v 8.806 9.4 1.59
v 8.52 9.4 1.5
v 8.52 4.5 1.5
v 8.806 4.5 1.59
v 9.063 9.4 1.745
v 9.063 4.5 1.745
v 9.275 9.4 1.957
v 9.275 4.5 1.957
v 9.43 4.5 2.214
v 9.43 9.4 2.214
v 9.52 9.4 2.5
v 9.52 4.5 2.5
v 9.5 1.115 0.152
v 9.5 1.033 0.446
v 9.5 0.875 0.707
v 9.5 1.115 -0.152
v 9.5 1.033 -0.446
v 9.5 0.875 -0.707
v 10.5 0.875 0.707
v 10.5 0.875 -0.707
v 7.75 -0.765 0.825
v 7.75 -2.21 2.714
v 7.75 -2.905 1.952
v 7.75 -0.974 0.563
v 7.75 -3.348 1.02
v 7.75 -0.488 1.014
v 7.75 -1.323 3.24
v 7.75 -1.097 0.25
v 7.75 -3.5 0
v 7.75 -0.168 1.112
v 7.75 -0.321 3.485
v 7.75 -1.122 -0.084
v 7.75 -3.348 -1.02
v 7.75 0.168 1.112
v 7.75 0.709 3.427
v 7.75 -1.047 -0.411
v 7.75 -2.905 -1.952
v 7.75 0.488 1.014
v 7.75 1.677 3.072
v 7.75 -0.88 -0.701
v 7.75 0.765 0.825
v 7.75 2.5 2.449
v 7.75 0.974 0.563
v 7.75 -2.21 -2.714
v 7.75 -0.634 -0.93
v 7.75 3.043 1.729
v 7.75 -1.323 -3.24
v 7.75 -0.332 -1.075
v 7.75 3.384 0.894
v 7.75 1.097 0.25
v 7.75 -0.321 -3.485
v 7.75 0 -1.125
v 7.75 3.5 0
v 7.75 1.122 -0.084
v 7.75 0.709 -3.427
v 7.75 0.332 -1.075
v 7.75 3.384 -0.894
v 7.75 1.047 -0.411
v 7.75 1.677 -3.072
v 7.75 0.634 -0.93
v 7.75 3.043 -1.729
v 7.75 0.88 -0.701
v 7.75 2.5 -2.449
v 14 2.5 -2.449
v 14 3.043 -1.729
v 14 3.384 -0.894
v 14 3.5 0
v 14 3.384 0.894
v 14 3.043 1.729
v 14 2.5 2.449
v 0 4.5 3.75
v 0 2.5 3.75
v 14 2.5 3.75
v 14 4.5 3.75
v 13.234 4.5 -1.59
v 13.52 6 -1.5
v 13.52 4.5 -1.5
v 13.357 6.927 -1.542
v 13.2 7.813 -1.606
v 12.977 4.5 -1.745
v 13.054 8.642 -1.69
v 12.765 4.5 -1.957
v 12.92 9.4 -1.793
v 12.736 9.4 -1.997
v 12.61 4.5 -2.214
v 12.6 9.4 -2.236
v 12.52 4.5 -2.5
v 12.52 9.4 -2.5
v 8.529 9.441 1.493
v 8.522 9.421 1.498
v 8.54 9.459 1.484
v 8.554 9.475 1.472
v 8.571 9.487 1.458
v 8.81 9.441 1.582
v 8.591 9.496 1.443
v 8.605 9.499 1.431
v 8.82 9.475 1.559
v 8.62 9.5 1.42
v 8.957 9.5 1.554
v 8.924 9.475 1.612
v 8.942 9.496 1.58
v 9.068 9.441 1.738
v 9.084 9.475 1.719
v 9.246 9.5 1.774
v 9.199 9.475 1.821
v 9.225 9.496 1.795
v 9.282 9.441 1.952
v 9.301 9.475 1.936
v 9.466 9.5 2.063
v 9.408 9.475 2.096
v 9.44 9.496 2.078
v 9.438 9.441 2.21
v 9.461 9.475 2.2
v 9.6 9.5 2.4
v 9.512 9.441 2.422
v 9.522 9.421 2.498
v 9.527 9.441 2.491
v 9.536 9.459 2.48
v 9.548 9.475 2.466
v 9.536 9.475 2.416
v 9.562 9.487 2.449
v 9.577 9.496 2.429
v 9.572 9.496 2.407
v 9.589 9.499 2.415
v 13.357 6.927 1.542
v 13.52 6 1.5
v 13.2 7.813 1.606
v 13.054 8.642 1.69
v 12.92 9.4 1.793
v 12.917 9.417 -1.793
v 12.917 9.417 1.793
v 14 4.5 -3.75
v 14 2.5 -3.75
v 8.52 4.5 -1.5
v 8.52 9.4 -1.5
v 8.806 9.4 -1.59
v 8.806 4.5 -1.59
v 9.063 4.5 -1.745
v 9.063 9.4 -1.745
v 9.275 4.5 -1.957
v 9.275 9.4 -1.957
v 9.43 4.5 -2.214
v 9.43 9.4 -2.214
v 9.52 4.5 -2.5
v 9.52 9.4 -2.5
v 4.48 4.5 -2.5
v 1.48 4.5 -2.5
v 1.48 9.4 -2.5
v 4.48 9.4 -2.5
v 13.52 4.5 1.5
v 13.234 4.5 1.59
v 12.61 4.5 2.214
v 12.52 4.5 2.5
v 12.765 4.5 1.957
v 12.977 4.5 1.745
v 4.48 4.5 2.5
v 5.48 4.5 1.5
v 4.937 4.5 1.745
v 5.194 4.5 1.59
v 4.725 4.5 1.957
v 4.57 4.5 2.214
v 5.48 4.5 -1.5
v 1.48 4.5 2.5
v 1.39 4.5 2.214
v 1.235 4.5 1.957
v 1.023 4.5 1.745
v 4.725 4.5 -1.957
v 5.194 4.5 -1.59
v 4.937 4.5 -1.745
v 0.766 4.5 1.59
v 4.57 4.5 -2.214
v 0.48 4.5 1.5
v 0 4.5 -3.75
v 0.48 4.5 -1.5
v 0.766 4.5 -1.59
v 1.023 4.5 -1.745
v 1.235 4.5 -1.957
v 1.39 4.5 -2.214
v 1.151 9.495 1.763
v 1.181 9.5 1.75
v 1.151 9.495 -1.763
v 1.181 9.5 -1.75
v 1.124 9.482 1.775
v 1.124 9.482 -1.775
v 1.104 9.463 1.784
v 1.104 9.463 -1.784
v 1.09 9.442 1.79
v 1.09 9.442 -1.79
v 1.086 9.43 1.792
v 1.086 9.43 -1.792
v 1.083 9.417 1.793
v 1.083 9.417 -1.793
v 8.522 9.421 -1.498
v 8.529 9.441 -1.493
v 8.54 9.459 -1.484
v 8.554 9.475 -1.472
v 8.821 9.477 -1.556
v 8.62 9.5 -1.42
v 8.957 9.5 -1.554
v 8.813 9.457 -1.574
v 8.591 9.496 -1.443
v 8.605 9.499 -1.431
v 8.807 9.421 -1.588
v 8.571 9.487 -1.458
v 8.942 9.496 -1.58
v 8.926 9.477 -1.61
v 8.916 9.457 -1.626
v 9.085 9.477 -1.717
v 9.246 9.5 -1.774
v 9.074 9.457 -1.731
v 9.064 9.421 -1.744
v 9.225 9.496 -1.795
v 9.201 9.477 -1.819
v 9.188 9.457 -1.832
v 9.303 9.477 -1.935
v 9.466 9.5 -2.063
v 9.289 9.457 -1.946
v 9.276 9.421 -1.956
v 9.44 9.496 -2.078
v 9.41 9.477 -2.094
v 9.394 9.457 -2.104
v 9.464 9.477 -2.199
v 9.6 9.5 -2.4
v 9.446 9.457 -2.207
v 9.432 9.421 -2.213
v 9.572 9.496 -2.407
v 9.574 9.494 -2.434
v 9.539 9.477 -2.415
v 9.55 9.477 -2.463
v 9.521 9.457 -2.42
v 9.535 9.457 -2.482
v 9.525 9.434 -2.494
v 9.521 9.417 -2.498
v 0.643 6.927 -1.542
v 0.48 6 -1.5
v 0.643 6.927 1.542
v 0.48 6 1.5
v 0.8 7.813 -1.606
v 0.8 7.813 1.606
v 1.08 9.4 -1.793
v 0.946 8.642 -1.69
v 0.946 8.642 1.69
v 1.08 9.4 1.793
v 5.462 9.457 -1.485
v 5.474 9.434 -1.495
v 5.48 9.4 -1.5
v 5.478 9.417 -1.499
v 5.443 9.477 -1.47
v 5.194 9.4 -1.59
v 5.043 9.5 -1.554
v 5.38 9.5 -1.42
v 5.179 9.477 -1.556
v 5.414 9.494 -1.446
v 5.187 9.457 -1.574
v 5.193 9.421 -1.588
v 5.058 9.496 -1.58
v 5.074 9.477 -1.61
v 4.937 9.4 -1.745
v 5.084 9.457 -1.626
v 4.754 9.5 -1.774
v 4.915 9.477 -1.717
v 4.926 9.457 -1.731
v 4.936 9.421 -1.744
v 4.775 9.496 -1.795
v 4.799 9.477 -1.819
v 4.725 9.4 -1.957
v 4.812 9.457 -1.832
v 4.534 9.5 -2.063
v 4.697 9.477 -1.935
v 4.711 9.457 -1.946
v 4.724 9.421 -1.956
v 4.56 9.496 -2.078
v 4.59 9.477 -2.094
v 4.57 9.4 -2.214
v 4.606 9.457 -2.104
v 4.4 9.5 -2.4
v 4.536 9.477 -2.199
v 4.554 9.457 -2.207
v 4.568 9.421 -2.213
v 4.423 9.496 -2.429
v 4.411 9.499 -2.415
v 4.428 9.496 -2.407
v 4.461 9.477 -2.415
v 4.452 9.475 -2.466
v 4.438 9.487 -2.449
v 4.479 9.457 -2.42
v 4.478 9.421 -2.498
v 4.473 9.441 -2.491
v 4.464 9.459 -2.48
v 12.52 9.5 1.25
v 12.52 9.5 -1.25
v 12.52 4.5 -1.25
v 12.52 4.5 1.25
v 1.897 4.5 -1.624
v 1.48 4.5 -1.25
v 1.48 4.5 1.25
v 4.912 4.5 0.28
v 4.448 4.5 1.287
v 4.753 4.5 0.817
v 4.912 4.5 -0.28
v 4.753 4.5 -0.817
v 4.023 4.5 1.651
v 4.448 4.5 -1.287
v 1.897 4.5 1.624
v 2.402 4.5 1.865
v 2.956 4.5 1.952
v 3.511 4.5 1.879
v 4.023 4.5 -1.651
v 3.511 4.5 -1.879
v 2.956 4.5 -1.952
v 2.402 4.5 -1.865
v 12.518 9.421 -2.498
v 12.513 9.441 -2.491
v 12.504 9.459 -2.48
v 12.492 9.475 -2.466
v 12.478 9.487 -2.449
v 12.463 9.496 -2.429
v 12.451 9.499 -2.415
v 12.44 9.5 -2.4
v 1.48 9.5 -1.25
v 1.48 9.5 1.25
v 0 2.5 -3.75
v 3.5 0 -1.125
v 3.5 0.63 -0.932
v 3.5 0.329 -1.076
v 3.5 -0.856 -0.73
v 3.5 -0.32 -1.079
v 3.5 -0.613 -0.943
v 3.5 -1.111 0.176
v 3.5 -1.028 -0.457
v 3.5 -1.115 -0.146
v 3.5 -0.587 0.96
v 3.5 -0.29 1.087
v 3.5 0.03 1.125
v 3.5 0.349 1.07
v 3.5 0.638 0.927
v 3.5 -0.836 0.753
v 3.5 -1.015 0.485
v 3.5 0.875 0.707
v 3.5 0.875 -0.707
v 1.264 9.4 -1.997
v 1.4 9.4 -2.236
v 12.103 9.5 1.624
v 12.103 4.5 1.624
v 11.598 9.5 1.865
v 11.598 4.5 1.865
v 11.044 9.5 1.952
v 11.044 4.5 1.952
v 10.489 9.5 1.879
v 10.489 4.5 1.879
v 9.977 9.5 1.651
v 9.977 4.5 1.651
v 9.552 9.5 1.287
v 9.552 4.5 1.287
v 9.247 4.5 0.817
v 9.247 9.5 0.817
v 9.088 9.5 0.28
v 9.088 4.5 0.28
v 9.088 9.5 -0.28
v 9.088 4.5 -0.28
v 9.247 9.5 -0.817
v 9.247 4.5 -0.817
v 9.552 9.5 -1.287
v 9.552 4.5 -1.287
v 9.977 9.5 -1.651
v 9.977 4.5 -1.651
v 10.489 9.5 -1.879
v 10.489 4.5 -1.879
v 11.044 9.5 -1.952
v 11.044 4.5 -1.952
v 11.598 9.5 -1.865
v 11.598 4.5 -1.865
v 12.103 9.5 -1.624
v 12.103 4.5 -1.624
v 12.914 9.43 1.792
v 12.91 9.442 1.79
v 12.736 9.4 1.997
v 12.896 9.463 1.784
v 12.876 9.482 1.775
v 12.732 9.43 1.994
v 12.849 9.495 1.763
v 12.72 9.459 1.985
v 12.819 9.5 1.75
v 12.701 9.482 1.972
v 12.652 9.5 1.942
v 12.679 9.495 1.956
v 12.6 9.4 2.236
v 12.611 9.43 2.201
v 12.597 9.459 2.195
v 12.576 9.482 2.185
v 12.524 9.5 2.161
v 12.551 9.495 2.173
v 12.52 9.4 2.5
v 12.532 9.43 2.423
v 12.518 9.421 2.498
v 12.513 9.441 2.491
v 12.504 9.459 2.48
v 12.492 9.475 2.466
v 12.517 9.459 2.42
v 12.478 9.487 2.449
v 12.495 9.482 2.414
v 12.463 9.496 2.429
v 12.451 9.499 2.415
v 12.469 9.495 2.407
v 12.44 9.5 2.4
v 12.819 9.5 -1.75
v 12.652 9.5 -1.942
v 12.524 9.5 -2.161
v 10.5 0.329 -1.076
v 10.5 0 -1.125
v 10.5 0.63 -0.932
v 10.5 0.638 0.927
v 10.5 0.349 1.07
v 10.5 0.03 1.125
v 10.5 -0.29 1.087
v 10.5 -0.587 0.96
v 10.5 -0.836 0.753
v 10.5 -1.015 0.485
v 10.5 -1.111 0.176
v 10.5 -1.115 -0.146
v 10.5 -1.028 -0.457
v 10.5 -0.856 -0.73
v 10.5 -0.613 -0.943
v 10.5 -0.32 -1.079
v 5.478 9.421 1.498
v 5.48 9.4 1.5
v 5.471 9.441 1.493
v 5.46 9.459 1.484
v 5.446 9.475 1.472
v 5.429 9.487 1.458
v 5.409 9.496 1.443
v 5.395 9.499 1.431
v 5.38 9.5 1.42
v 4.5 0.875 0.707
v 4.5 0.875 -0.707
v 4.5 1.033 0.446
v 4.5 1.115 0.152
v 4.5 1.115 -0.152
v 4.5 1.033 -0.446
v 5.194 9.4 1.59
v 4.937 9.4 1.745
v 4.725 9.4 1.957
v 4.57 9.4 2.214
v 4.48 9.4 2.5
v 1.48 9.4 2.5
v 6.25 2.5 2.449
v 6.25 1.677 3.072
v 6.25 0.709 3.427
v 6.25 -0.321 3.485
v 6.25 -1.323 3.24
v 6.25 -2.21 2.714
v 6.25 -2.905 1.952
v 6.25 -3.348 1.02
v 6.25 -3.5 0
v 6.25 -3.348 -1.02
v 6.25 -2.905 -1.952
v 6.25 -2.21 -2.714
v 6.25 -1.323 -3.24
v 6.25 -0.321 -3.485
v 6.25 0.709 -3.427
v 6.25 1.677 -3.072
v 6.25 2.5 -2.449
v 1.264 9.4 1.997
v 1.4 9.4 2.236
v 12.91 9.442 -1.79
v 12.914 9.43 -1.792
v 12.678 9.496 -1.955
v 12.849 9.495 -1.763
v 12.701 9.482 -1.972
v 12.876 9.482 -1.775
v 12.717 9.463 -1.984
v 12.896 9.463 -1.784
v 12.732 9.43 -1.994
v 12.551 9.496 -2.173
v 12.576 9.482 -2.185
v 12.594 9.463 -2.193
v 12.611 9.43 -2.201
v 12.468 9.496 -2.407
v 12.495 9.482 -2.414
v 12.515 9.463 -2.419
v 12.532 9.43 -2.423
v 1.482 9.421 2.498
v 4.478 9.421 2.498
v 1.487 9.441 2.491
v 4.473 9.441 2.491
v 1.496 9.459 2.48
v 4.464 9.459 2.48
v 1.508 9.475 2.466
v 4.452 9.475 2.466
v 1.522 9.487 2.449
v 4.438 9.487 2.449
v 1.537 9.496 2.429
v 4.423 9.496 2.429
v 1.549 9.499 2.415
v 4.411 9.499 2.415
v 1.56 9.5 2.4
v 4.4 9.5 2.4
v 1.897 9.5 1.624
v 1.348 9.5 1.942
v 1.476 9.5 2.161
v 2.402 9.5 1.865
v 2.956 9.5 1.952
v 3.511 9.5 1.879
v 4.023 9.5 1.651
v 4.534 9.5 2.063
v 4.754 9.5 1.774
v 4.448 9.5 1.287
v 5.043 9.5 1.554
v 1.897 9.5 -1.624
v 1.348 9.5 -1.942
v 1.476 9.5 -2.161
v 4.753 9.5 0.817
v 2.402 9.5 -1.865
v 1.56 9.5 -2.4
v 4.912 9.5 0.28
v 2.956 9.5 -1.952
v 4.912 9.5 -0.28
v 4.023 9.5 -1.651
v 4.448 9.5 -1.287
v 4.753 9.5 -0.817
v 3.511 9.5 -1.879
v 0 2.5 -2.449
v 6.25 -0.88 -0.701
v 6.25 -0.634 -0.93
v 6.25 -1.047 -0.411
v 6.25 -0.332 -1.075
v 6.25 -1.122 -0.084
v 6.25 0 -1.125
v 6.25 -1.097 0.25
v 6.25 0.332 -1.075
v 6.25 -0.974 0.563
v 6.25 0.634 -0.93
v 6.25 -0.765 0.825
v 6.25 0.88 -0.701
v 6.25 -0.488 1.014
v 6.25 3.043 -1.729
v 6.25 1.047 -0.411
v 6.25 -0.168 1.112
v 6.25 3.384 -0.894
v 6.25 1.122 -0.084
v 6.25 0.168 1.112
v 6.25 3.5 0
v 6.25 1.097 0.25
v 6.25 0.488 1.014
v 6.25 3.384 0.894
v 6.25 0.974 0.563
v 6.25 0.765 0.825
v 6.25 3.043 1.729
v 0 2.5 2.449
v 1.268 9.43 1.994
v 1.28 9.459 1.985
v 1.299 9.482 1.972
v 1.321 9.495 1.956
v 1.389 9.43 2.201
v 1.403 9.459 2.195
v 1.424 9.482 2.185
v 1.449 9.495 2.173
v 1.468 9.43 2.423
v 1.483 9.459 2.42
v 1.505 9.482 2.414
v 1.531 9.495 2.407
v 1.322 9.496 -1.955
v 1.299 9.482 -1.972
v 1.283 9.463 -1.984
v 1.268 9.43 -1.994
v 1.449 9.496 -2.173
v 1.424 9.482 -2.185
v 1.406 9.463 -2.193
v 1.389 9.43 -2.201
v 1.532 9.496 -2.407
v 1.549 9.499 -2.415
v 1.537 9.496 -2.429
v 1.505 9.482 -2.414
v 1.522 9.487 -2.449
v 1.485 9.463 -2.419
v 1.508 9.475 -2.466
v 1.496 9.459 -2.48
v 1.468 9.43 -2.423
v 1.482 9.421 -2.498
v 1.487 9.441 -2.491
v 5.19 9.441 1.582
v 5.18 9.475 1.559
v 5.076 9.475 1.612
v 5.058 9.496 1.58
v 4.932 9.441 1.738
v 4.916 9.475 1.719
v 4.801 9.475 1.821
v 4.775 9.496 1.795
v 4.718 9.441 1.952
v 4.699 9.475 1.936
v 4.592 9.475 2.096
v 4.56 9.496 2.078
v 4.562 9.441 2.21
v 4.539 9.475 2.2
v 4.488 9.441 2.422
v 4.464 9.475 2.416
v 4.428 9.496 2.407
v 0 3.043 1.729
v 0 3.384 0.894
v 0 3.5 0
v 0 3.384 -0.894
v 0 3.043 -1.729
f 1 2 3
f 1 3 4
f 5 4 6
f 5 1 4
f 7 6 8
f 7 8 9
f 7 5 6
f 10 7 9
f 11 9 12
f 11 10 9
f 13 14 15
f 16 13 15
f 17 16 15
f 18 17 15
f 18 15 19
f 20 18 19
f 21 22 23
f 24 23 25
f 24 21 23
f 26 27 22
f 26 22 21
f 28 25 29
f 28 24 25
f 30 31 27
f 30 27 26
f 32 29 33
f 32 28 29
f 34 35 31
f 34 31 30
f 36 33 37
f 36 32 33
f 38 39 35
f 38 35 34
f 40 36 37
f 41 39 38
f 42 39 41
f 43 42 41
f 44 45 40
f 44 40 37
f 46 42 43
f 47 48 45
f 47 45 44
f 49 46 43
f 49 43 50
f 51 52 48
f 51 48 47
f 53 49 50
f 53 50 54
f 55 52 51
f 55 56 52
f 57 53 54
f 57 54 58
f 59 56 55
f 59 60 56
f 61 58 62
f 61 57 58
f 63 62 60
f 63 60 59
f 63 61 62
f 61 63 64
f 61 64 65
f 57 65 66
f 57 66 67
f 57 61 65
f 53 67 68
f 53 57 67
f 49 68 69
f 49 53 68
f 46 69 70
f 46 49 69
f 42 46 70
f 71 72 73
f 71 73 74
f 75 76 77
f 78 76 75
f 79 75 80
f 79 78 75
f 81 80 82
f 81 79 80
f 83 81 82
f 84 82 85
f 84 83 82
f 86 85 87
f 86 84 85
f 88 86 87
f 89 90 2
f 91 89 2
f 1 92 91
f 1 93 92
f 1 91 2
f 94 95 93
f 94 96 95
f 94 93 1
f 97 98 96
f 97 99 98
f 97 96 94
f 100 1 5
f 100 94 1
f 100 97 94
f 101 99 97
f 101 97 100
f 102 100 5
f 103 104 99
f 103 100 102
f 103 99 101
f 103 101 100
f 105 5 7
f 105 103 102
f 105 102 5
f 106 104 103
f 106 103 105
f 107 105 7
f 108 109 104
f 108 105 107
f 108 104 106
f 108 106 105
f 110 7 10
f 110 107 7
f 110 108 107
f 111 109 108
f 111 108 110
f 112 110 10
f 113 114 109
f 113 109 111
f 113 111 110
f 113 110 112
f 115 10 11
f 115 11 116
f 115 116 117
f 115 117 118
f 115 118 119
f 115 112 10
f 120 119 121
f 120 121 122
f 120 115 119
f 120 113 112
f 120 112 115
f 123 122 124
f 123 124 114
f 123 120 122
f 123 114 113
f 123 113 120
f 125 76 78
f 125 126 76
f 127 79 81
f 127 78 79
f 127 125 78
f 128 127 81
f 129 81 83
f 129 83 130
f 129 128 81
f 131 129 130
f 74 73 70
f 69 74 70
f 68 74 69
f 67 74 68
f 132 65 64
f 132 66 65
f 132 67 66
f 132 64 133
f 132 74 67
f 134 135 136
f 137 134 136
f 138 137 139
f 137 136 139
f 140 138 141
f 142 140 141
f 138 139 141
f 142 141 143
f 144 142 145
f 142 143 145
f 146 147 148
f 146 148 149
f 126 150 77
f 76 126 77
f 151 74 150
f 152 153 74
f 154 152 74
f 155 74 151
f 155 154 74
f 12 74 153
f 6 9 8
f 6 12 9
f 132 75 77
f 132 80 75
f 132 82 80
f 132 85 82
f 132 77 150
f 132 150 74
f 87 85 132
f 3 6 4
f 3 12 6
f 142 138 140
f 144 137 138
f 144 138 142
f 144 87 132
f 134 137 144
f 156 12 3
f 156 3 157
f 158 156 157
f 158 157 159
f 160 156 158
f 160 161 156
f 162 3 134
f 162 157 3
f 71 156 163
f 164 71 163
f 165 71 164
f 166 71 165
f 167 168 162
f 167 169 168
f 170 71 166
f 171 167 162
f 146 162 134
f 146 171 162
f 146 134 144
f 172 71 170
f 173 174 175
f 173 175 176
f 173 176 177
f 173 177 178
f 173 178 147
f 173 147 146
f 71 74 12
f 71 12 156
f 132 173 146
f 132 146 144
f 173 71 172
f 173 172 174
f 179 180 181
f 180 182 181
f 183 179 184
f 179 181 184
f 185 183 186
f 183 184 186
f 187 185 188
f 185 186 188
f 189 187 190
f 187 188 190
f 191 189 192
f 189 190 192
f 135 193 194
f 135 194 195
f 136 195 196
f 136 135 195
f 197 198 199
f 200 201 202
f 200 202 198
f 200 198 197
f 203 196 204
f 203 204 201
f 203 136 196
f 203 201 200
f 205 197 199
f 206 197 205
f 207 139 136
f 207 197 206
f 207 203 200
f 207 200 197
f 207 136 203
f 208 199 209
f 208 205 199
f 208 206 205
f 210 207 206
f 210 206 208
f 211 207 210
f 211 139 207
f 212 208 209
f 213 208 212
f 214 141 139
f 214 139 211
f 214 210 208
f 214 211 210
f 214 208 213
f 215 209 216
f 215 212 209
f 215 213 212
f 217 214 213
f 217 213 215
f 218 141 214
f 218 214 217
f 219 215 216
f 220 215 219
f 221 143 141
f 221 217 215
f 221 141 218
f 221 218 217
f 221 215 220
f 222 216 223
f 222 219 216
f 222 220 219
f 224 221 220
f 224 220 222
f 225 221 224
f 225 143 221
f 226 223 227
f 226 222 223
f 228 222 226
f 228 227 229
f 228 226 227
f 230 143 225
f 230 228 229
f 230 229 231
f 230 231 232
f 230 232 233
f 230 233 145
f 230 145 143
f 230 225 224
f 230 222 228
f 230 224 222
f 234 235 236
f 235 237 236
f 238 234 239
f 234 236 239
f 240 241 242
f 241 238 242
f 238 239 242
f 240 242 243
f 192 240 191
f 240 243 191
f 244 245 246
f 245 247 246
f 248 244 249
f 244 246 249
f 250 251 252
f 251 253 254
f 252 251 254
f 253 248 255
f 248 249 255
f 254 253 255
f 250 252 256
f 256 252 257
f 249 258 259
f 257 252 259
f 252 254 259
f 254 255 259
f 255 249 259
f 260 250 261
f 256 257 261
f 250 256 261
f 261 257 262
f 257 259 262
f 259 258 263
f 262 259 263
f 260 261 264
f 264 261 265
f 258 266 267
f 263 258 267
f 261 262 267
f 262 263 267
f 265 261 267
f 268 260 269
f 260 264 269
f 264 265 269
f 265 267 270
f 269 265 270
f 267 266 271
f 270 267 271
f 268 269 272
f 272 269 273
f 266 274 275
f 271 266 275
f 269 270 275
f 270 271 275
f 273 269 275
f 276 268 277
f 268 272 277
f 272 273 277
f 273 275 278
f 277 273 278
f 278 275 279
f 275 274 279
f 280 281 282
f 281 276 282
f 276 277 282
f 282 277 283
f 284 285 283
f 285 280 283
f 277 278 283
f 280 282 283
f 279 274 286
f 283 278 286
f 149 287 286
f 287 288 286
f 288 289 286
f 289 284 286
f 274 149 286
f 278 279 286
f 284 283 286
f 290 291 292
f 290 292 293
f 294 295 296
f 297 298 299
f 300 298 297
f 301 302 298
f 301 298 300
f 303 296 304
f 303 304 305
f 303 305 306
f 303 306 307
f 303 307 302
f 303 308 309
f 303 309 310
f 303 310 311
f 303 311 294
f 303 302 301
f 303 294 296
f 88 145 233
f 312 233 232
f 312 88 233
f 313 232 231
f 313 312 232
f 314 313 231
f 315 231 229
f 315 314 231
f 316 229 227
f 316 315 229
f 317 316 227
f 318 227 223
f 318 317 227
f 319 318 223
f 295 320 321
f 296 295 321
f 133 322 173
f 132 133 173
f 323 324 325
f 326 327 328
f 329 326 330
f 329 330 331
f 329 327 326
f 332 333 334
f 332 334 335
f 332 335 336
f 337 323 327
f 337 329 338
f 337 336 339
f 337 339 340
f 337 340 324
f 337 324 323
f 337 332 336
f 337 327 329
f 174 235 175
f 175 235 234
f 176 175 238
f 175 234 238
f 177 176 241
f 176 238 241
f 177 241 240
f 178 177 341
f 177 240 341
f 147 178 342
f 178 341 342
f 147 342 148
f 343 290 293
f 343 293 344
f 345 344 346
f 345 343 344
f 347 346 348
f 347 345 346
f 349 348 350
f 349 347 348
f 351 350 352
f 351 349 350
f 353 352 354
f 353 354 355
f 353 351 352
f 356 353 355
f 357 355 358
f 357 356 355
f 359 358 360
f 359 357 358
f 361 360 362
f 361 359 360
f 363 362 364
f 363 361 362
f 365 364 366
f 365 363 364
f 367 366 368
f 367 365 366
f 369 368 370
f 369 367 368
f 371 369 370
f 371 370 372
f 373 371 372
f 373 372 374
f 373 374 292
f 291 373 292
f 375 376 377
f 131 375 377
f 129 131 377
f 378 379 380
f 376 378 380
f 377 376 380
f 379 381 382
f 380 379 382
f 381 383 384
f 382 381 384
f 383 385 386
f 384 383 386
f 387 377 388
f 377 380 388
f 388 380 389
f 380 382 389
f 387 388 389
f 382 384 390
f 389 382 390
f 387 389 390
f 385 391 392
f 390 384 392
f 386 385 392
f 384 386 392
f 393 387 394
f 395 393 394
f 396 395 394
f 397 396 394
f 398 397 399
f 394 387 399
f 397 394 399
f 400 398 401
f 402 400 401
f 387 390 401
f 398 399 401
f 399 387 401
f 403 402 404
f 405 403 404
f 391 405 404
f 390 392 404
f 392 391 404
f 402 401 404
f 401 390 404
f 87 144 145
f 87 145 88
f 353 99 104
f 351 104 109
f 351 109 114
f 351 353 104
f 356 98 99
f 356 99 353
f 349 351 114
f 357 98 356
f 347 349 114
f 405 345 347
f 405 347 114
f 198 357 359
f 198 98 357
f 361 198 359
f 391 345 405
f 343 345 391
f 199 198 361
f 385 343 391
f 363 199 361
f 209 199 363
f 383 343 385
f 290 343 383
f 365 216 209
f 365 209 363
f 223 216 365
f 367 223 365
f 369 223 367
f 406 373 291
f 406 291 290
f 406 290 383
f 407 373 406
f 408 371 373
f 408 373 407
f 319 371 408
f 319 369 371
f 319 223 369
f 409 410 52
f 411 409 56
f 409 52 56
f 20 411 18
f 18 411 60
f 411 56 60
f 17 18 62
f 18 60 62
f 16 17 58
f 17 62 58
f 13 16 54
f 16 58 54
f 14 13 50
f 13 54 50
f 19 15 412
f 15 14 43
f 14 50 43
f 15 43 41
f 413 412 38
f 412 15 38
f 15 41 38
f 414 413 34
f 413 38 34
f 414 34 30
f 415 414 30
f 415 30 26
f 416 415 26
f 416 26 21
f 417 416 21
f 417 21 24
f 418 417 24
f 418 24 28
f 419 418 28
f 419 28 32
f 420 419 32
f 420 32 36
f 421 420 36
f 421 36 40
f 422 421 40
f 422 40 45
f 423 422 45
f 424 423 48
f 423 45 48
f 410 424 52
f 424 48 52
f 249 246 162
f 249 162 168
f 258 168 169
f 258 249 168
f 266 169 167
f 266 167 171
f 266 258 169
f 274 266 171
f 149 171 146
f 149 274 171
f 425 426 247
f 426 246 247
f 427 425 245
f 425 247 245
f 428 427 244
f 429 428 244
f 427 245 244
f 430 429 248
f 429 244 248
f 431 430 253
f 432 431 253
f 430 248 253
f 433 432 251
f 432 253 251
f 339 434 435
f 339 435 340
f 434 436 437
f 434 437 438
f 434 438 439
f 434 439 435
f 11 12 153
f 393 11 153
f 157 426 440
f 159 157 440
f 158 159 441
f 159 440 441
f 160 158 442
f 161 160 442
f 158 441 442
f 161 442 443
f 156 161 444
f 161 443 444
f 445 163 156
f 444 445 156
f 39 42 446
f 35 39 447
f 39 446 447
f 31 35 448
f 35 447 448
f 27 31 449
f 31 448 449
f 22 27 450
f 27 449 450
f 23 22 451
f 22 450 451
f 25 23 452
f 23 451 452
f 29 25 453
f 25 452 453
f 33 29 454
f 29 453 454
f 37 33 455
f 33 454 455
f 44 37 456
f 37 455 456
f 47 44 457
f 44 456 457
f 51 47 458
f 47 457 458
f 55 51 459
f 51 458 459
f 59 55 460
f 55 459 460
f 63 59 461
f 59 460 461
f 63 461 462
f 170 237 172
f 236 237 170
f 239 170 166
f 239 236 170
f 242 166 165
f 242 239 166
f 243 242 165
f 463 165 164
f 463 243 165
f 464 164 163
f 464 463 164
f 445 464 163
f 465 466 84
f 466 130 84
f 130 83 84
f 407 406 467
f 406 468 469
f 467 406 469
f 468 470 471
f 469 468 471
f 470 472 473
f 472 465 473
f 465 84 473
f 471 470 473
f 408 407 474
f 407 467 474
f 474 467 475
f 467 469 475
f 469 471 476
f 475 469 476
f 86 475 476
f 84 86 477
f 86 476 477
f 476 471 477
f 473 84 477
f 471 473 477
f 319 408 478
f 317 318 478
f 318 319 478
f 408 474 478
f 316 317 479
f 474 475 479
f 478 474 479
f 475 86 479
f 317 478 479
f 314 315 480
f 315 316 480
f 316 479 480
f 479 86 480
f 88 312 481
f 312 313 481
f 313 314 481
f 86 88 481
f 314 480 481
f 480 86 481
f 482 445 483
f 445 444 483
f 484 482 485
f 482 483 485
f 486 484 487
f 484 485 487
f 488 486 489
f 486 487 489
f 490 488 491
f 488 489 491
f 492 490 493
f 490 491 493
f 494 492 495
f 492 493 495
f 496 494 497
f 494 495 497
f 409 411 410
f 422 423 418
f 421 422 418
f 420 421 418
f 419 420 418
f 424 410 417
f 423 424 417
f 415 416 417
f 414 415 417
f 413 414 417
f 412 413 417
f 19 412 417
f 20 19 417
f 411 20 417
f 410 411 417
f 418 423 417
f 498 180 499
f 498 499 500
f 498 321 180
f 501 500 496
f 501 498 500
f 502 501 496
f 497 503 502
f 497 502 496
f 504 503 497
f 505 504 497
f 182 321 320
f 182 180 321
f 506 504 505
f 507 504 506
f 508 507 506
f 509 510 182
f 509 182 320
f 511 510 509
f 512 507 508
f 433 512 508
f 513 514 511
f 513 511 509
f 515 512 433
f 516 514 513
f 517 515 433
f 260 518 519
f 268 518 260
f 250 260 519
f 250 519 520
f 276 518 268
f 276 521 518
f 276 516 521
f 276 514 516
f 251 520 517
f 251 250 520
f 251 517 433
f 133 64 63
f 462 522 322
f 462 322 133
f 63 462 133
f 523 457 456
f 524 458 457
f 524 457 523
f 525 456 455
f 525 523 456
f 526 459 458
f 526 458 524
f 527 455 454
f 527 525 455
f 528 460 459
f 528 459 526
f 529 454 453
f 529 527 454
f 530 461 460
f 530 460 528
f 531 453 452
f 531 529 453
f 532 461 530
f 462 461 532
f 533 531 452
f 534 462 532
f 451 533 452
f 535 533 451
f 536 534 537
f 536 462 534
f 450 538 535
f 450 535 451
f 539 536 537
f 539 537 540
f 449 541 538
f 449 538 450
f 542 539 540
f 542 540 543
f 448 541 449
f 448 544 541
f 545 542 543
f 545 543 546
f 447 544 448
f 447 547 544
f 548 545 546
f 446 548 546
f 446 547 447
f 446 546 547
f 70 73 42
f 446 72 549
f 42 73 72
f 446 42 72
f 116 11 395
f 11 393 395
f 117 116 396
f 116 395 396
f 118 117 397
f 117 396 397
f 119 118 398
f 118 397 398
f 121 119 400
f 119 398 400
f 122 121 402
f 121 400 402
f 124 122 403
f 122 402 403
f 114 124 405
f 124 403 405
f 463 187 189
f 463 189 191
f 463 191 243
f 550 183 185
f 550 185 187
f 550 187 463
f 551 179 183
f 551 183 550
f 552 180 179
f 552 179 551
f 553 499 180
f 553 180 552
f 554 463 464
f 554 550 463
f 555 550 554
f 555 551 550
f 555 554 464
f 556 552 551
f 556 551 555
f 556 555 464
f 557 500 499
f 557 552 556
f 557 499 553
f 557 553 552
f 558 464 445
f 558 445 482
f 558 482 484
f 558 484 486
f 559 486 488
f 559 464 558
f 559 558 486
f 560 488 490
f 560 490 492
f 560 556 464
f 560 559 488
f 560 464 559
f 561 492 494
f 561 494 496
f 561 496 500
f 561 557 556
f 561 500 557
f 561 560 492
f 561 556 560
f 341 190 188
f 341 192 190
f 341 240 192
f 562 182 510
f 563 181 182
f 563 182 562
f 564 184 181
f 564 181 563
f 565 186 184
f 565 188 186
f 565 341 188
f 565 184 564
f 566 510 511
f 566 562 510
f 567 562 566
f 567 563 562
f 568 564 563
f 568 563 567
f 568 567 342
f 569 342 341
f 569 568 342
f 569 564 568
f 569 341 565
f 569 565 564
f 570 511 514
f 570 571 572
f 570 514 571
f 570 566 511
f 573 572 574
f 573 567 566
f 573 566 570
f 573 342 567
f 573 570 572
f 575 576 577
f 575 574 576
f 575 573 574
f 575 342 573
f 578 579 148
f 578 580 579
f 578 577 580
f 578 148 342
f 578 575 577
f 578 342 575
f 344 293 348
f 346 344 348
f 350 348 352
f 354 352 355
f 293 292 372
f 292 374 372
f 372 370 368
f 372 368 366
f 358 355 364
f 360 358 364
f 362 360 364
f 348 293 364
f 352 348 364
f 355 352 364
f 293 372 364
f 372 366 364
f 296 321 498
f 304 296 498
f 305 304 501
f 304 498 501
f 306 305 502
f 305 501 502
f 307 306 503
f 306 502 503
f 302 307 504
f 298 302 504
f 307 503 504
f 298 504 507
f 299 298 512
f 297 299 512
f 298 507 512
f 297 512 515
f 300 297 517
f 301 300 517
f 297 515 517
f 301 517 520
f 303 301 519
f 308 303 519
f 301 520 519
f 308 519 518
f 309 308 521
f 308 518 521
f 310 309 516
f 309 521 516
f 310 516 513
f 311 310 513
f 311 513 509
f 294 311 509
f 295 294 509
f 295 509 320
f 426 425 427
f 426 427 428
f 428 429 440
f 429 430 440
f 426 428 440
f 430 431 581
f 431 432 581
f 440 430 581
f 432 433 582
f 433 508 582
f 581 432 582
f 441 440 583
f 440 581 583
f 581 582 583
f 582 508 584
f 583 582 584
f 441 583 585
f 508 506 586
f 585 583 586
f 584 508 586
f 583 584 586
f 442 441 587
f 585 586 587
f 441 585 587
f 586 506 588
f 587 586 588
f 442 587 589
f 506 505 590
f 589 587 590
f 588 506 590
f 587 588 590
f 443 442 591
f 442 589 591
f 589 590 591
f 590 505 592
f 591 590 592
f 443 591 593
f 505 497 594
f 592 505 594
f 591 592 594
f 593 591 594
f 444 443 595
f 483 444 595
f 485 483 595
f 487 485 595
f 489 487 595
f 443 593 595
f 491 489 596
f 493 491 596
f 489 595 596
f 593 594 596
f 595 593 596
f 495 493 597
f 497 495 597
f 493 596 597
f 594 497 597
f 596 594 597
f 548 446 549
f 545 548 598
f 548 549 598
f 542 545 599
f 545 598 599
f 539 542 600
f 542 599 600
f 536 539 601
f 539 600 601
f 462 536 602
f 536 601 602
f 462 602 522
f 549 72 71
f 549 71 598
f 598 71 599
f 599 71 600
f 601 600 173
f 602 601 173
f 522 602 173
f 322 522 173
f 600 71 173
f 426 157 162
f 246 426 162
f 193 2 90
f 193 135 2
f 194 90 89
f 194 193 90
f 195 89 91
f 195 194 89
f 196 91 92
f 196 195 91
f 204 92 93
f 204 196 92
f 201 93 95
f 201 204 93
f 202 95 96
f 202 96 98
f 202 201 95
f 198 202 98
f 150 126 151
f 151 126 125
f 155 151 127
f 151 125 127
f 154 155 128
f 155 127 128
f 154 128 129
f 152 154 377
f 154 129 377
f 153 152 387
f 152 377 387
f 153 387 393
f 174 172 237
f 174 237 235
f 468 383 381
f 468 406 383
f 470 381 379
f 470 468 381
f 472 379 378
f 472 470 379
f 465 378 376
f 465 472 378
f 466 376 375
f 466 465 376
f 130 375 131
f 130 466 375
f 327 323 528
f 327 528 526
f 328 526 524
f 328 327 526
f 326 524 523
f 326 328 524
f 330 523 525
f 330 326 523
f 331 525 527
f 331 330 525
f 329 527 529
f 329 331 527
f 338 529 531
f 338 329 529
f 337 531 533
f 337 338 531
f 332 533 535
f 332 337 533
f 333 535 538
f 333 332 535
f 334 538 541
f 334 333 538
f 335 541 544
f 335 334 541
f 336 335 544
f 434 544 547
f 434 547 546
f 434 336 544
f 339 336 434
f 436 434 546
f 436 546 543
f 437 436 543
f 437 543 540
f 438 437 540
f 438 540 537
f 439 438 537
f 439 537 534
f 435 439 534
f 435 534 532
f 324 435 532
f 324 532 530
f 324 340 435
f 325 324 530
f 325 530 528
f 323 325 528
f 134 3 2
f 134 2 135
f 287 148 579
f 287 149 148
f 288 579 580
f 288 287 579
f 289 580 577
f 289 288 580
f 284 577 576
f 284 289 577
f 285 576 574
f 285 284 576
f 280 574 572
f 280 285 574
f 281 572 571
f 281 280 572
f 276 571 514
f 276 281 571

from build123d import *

# Parameters (mm, degrees)
SKETCH1_R           = 3.5
BOSS_EXTRUDE1_DEPTH = 14
SKETCH2_W           = 7.5
SKETCH2_H           = 2
BOSS_EXTRUDE2_DEPTH = 14
CUT_EXTRUDE1_START  = -6.25
SKETCH4_R           = 3.5
SKETCH4_R_2         = 1.125
CUT_EXTRUDE1_DEPTH  = 6.25
SKETCH5_R           = 3.5
SKETCH5_R_2         = 1.125
CUT_EXTRUDE2_DEPTH  = 6.25
CUT_EXTRUDE3_DEPTH  = 17.507574019
SKETCH7_W           = 5
SKETCH7_H           = 5
BOSS_EXTRUDE3_DEPTH = 5
CUT_EXTRUDE4_DEPTH  = 19.506755523
CUT_EXTRUDE5_DEPTH  = 5
FILLET1_R           = 0.1
CUT_EXTRUDE6_DEPTH  = 5


with BuildPart() as part:
    # Sketch1 → Boss-Extrude1 (new body)
    with BuildSketch(Plane(origin=(0, 0, 0), x_dir=(0, 0, -1), z_dir=(1, 0, 0))):
        Circle(SKETCH1_R)
    extrude(amount=BOSS_EXTRUDE1_DEPTH)

    # Sketch2 → Boss-Extrude2 (add)
    with BuildSketch(Plane(origin=(0, 0, 0), x_dir=(0, 0, -1), z_dir=(1, 0, 0))):
        with Locations((0, 3.5)):
            Rectangle(SKETCH2_W, SKETCH2_H)
    extrude(amount=BOSS_EXTRUDE2_DEPTH)

    # Sketch4 → Cut-Extrude1 (cut)
    with BuildSketch(Plane(origin=(14, 0, 0), x_dir=(0, 0, -1), z_dir=(1, 0, 0)).offset(CUT_EXTRUDE1_START)):
        Circle(SKETCH4_R)
        Circle(SKETCH4_R_2, mode=Mode.SUBTRACT)
    extrude(amount=CUT_EXTRUDE1_DEPTH, mode=Mode.SUBTRACT)

    # Sketch5 → Cut-Extrude2 (cut)
    with BuildSketch(Plane.ZY):
        Circle(SKETCH5_R)
        with Locations(Location((0, 0, 0), (0, 0, 180))):
            Circle(SKETCH5_R_2, mode=Mode.SUBTRACT)
    extrude(amount=-CUT_EXTRUDE2_DEPTH, mode=Mode.SUBTRACT)

    # Sketch6 → Cut-Extrude3 (cut, through all)
    with BuildSketch(Plane.XY.offset(3.75)):
        Polygon((0, -1.495013081), (0, 1.709332254), (4.5, 1.709332254), (4.5, 0.875), (3.5, 0.875), (3.5, -1.495013081), align=None)
        Polygon((10.5, 0.875), (10.5, -1.495013081), (14, -1.495013081), (14, 1.709332254), (9.5, 1.709332254), (9.5, 0.875), align=None)
    extrude(amount=-CUT_EXTRUDE3_DEPTH, mode=Mode.SUBTRACT)

    # Sketch7 → Boss-Extrude3 (add)
    with BuildSketch(Plane(origin=(0, 4.5, 0), x_dir=(1, 0, 0), z_dir=(0, 1, 0))):
        with Locations((2.98, 0)):
            Rectangle(SKETCH7_W, SKETCH7_H)
        with Locations((11.02, 0)):
            Rectangle(SKETCH7_W, SKETCH7_H)
    extrude(amount=BOSS_EXTRUDE3_DEPTH)

    # Sketch8 → Cut-Extrude4 (cut, through all)
    with BuildSketch(Plane.XY.offset(3.75)):
        Polygon((2.157769387, 15.515103022), (0.48, 15.515103022), (0.48, 6), align=None)
        Polygon((13.52, 6), (11.842230613, 15.515103022), (13.52, 15.515103022), align=None)
    extrude(amount=-CUT_EXTRUDE4_DEPTH, mode=Mode.SUBTRACT)

    # Sketch9 → Cut-Extrude5 (cut)
    with BuildSketch(Plane(origin=(0, 9.5, 0), x_dir=(1, 0, 0), z_dir=(0, 1, 0))):
        with BuildLine():
            Line((4.48, 2.5), (5.48, 2.5))
            Line((5.48, 2.5), (5.48, 1.5))
            ThreePointArc((5.48, 1.5), (4.82498551, 1.84498551), (4.48, 2.5))
        make_face()
        with BuildLine():
            Line((0.48, 2.5), (0.48, 1.5))
            ThreePointArc((0.48, 1.5), (1.13501449, 1.84498551), (1.48, 2.5))
            Line((1.48, 2.5), (0.48, 2.5))
        make_face()
        with BuildLine():
            Line((5.48, -2.5), (5.48, -1.5))
            ThreePointArc((5.48, -1.5), (4.82498551, -1.84498551), (4.48, -2.5))
            Line((4.48, -2.5), (5.48, -2.5))
        make_face()
        with BuildLine():
            Line((0.48, -2.5), (0.48, -1.5))
            ThreePointArc((0.48, -1.5), (1.13501449, -1.84498551), (1.48, -2.5))
            Line((1.48, -2.5), (0.48, -2.5))
        make_face()
        with BuildLine():
            Line((8.52, -2.5), (8.52, -1.5))
            ThreePointArc((8.52, -1.5), (9.17501449, -1.84498551), (9.52, -2.5))
            Line((9.52, -2.5), (8.52, -2.5))
        make_face()
        with BuildLine():
            Line((12.52, -2.5), (13.52, -2.5))
            Line((13.52, -2.5), (13.52, -1.5))
            ThreePointArc((13.52, -1.5), (12.86498551, -1.84498551), (12.52, -2.5))
        make_face()
        with BuildLine():
            Line((13.52, 2.5), (13.52, 1.5))
            ThreePointArc((13.52, 1.5), (12.86498551, 1.84498551), (12.52, 2.5))
            Line((12.52, 2.5), (13.52, 2.5))
        make_face()
        with BuildLine():
            Line((8.52, 2.5), (8.52, 1.5))
            ThreePointArc((8.52, 1.5), (9.17501449, 1.84498551), (9.52, 2.5))
            Line((9.52, 2.5), (8.52, 2.5))
        make_face()
    extrude(amount=-CUT_EXTRUDE5_DEPTH, mode=Mode.SUBTRACT)

    # Fillet1
    fillet1_edges = [part.edges().sort_by_distance(p)[0] for p in [
        (1.097144432, 9.5, 0),
        (2.98, 9.5, -2.5),
        (4.82498551, 9.5, -1.84498551),
        (5.48, 9.5, 0),
        (4.82498551, 9.5, 1.84498551),
        (2.98, 9.5, 2.5),
        (8.52, 9.5, 0),
        (9.17501449, 9.5, -1.84498551),
        (11.02, 9.5, -2.5),
        (12.902855568, 9.5, 0),
        (11.02, 9.5, 2.5),
        (9.17501449, 9.5, 1.84498551),
        (1.344642616, 9.5, -2.123284662),
        (1.344642616, 9.5, 2.123284662),
        (12.655357384, 9.5, -2.123284662),
        (12.655357384, 9.5, 2.123284662),
    ]]
    fillet(fillet1_edges, radius=FILLET1_R)

    # Sketch10 → Cut-Extrude6 (cut)
    with BuildSketch(Plane(origin=(0, 9.5, 0), x_dir=(1, 0, 0), z_dir=(0, 1, 0))):
        with BuildLine():
            Line((1.48, 1.25), (1.48, -1.25))
            ThreePointArc((1.48, -1.25), (4.932562419, 0), (1.48, 1.25))
        make_face()
        with BuildLine():
            Line((12.52, 1.25), (12.52, -1.25))
            ThreePointArc((12.52, -1.25), (9.067437581, 0), (12.52, 1.25))
        make_face()
    extrude(amount=-CUT_EXTRUDE6_DEPTH, mode=Mode.SUBTRACT)


solid = part.part
